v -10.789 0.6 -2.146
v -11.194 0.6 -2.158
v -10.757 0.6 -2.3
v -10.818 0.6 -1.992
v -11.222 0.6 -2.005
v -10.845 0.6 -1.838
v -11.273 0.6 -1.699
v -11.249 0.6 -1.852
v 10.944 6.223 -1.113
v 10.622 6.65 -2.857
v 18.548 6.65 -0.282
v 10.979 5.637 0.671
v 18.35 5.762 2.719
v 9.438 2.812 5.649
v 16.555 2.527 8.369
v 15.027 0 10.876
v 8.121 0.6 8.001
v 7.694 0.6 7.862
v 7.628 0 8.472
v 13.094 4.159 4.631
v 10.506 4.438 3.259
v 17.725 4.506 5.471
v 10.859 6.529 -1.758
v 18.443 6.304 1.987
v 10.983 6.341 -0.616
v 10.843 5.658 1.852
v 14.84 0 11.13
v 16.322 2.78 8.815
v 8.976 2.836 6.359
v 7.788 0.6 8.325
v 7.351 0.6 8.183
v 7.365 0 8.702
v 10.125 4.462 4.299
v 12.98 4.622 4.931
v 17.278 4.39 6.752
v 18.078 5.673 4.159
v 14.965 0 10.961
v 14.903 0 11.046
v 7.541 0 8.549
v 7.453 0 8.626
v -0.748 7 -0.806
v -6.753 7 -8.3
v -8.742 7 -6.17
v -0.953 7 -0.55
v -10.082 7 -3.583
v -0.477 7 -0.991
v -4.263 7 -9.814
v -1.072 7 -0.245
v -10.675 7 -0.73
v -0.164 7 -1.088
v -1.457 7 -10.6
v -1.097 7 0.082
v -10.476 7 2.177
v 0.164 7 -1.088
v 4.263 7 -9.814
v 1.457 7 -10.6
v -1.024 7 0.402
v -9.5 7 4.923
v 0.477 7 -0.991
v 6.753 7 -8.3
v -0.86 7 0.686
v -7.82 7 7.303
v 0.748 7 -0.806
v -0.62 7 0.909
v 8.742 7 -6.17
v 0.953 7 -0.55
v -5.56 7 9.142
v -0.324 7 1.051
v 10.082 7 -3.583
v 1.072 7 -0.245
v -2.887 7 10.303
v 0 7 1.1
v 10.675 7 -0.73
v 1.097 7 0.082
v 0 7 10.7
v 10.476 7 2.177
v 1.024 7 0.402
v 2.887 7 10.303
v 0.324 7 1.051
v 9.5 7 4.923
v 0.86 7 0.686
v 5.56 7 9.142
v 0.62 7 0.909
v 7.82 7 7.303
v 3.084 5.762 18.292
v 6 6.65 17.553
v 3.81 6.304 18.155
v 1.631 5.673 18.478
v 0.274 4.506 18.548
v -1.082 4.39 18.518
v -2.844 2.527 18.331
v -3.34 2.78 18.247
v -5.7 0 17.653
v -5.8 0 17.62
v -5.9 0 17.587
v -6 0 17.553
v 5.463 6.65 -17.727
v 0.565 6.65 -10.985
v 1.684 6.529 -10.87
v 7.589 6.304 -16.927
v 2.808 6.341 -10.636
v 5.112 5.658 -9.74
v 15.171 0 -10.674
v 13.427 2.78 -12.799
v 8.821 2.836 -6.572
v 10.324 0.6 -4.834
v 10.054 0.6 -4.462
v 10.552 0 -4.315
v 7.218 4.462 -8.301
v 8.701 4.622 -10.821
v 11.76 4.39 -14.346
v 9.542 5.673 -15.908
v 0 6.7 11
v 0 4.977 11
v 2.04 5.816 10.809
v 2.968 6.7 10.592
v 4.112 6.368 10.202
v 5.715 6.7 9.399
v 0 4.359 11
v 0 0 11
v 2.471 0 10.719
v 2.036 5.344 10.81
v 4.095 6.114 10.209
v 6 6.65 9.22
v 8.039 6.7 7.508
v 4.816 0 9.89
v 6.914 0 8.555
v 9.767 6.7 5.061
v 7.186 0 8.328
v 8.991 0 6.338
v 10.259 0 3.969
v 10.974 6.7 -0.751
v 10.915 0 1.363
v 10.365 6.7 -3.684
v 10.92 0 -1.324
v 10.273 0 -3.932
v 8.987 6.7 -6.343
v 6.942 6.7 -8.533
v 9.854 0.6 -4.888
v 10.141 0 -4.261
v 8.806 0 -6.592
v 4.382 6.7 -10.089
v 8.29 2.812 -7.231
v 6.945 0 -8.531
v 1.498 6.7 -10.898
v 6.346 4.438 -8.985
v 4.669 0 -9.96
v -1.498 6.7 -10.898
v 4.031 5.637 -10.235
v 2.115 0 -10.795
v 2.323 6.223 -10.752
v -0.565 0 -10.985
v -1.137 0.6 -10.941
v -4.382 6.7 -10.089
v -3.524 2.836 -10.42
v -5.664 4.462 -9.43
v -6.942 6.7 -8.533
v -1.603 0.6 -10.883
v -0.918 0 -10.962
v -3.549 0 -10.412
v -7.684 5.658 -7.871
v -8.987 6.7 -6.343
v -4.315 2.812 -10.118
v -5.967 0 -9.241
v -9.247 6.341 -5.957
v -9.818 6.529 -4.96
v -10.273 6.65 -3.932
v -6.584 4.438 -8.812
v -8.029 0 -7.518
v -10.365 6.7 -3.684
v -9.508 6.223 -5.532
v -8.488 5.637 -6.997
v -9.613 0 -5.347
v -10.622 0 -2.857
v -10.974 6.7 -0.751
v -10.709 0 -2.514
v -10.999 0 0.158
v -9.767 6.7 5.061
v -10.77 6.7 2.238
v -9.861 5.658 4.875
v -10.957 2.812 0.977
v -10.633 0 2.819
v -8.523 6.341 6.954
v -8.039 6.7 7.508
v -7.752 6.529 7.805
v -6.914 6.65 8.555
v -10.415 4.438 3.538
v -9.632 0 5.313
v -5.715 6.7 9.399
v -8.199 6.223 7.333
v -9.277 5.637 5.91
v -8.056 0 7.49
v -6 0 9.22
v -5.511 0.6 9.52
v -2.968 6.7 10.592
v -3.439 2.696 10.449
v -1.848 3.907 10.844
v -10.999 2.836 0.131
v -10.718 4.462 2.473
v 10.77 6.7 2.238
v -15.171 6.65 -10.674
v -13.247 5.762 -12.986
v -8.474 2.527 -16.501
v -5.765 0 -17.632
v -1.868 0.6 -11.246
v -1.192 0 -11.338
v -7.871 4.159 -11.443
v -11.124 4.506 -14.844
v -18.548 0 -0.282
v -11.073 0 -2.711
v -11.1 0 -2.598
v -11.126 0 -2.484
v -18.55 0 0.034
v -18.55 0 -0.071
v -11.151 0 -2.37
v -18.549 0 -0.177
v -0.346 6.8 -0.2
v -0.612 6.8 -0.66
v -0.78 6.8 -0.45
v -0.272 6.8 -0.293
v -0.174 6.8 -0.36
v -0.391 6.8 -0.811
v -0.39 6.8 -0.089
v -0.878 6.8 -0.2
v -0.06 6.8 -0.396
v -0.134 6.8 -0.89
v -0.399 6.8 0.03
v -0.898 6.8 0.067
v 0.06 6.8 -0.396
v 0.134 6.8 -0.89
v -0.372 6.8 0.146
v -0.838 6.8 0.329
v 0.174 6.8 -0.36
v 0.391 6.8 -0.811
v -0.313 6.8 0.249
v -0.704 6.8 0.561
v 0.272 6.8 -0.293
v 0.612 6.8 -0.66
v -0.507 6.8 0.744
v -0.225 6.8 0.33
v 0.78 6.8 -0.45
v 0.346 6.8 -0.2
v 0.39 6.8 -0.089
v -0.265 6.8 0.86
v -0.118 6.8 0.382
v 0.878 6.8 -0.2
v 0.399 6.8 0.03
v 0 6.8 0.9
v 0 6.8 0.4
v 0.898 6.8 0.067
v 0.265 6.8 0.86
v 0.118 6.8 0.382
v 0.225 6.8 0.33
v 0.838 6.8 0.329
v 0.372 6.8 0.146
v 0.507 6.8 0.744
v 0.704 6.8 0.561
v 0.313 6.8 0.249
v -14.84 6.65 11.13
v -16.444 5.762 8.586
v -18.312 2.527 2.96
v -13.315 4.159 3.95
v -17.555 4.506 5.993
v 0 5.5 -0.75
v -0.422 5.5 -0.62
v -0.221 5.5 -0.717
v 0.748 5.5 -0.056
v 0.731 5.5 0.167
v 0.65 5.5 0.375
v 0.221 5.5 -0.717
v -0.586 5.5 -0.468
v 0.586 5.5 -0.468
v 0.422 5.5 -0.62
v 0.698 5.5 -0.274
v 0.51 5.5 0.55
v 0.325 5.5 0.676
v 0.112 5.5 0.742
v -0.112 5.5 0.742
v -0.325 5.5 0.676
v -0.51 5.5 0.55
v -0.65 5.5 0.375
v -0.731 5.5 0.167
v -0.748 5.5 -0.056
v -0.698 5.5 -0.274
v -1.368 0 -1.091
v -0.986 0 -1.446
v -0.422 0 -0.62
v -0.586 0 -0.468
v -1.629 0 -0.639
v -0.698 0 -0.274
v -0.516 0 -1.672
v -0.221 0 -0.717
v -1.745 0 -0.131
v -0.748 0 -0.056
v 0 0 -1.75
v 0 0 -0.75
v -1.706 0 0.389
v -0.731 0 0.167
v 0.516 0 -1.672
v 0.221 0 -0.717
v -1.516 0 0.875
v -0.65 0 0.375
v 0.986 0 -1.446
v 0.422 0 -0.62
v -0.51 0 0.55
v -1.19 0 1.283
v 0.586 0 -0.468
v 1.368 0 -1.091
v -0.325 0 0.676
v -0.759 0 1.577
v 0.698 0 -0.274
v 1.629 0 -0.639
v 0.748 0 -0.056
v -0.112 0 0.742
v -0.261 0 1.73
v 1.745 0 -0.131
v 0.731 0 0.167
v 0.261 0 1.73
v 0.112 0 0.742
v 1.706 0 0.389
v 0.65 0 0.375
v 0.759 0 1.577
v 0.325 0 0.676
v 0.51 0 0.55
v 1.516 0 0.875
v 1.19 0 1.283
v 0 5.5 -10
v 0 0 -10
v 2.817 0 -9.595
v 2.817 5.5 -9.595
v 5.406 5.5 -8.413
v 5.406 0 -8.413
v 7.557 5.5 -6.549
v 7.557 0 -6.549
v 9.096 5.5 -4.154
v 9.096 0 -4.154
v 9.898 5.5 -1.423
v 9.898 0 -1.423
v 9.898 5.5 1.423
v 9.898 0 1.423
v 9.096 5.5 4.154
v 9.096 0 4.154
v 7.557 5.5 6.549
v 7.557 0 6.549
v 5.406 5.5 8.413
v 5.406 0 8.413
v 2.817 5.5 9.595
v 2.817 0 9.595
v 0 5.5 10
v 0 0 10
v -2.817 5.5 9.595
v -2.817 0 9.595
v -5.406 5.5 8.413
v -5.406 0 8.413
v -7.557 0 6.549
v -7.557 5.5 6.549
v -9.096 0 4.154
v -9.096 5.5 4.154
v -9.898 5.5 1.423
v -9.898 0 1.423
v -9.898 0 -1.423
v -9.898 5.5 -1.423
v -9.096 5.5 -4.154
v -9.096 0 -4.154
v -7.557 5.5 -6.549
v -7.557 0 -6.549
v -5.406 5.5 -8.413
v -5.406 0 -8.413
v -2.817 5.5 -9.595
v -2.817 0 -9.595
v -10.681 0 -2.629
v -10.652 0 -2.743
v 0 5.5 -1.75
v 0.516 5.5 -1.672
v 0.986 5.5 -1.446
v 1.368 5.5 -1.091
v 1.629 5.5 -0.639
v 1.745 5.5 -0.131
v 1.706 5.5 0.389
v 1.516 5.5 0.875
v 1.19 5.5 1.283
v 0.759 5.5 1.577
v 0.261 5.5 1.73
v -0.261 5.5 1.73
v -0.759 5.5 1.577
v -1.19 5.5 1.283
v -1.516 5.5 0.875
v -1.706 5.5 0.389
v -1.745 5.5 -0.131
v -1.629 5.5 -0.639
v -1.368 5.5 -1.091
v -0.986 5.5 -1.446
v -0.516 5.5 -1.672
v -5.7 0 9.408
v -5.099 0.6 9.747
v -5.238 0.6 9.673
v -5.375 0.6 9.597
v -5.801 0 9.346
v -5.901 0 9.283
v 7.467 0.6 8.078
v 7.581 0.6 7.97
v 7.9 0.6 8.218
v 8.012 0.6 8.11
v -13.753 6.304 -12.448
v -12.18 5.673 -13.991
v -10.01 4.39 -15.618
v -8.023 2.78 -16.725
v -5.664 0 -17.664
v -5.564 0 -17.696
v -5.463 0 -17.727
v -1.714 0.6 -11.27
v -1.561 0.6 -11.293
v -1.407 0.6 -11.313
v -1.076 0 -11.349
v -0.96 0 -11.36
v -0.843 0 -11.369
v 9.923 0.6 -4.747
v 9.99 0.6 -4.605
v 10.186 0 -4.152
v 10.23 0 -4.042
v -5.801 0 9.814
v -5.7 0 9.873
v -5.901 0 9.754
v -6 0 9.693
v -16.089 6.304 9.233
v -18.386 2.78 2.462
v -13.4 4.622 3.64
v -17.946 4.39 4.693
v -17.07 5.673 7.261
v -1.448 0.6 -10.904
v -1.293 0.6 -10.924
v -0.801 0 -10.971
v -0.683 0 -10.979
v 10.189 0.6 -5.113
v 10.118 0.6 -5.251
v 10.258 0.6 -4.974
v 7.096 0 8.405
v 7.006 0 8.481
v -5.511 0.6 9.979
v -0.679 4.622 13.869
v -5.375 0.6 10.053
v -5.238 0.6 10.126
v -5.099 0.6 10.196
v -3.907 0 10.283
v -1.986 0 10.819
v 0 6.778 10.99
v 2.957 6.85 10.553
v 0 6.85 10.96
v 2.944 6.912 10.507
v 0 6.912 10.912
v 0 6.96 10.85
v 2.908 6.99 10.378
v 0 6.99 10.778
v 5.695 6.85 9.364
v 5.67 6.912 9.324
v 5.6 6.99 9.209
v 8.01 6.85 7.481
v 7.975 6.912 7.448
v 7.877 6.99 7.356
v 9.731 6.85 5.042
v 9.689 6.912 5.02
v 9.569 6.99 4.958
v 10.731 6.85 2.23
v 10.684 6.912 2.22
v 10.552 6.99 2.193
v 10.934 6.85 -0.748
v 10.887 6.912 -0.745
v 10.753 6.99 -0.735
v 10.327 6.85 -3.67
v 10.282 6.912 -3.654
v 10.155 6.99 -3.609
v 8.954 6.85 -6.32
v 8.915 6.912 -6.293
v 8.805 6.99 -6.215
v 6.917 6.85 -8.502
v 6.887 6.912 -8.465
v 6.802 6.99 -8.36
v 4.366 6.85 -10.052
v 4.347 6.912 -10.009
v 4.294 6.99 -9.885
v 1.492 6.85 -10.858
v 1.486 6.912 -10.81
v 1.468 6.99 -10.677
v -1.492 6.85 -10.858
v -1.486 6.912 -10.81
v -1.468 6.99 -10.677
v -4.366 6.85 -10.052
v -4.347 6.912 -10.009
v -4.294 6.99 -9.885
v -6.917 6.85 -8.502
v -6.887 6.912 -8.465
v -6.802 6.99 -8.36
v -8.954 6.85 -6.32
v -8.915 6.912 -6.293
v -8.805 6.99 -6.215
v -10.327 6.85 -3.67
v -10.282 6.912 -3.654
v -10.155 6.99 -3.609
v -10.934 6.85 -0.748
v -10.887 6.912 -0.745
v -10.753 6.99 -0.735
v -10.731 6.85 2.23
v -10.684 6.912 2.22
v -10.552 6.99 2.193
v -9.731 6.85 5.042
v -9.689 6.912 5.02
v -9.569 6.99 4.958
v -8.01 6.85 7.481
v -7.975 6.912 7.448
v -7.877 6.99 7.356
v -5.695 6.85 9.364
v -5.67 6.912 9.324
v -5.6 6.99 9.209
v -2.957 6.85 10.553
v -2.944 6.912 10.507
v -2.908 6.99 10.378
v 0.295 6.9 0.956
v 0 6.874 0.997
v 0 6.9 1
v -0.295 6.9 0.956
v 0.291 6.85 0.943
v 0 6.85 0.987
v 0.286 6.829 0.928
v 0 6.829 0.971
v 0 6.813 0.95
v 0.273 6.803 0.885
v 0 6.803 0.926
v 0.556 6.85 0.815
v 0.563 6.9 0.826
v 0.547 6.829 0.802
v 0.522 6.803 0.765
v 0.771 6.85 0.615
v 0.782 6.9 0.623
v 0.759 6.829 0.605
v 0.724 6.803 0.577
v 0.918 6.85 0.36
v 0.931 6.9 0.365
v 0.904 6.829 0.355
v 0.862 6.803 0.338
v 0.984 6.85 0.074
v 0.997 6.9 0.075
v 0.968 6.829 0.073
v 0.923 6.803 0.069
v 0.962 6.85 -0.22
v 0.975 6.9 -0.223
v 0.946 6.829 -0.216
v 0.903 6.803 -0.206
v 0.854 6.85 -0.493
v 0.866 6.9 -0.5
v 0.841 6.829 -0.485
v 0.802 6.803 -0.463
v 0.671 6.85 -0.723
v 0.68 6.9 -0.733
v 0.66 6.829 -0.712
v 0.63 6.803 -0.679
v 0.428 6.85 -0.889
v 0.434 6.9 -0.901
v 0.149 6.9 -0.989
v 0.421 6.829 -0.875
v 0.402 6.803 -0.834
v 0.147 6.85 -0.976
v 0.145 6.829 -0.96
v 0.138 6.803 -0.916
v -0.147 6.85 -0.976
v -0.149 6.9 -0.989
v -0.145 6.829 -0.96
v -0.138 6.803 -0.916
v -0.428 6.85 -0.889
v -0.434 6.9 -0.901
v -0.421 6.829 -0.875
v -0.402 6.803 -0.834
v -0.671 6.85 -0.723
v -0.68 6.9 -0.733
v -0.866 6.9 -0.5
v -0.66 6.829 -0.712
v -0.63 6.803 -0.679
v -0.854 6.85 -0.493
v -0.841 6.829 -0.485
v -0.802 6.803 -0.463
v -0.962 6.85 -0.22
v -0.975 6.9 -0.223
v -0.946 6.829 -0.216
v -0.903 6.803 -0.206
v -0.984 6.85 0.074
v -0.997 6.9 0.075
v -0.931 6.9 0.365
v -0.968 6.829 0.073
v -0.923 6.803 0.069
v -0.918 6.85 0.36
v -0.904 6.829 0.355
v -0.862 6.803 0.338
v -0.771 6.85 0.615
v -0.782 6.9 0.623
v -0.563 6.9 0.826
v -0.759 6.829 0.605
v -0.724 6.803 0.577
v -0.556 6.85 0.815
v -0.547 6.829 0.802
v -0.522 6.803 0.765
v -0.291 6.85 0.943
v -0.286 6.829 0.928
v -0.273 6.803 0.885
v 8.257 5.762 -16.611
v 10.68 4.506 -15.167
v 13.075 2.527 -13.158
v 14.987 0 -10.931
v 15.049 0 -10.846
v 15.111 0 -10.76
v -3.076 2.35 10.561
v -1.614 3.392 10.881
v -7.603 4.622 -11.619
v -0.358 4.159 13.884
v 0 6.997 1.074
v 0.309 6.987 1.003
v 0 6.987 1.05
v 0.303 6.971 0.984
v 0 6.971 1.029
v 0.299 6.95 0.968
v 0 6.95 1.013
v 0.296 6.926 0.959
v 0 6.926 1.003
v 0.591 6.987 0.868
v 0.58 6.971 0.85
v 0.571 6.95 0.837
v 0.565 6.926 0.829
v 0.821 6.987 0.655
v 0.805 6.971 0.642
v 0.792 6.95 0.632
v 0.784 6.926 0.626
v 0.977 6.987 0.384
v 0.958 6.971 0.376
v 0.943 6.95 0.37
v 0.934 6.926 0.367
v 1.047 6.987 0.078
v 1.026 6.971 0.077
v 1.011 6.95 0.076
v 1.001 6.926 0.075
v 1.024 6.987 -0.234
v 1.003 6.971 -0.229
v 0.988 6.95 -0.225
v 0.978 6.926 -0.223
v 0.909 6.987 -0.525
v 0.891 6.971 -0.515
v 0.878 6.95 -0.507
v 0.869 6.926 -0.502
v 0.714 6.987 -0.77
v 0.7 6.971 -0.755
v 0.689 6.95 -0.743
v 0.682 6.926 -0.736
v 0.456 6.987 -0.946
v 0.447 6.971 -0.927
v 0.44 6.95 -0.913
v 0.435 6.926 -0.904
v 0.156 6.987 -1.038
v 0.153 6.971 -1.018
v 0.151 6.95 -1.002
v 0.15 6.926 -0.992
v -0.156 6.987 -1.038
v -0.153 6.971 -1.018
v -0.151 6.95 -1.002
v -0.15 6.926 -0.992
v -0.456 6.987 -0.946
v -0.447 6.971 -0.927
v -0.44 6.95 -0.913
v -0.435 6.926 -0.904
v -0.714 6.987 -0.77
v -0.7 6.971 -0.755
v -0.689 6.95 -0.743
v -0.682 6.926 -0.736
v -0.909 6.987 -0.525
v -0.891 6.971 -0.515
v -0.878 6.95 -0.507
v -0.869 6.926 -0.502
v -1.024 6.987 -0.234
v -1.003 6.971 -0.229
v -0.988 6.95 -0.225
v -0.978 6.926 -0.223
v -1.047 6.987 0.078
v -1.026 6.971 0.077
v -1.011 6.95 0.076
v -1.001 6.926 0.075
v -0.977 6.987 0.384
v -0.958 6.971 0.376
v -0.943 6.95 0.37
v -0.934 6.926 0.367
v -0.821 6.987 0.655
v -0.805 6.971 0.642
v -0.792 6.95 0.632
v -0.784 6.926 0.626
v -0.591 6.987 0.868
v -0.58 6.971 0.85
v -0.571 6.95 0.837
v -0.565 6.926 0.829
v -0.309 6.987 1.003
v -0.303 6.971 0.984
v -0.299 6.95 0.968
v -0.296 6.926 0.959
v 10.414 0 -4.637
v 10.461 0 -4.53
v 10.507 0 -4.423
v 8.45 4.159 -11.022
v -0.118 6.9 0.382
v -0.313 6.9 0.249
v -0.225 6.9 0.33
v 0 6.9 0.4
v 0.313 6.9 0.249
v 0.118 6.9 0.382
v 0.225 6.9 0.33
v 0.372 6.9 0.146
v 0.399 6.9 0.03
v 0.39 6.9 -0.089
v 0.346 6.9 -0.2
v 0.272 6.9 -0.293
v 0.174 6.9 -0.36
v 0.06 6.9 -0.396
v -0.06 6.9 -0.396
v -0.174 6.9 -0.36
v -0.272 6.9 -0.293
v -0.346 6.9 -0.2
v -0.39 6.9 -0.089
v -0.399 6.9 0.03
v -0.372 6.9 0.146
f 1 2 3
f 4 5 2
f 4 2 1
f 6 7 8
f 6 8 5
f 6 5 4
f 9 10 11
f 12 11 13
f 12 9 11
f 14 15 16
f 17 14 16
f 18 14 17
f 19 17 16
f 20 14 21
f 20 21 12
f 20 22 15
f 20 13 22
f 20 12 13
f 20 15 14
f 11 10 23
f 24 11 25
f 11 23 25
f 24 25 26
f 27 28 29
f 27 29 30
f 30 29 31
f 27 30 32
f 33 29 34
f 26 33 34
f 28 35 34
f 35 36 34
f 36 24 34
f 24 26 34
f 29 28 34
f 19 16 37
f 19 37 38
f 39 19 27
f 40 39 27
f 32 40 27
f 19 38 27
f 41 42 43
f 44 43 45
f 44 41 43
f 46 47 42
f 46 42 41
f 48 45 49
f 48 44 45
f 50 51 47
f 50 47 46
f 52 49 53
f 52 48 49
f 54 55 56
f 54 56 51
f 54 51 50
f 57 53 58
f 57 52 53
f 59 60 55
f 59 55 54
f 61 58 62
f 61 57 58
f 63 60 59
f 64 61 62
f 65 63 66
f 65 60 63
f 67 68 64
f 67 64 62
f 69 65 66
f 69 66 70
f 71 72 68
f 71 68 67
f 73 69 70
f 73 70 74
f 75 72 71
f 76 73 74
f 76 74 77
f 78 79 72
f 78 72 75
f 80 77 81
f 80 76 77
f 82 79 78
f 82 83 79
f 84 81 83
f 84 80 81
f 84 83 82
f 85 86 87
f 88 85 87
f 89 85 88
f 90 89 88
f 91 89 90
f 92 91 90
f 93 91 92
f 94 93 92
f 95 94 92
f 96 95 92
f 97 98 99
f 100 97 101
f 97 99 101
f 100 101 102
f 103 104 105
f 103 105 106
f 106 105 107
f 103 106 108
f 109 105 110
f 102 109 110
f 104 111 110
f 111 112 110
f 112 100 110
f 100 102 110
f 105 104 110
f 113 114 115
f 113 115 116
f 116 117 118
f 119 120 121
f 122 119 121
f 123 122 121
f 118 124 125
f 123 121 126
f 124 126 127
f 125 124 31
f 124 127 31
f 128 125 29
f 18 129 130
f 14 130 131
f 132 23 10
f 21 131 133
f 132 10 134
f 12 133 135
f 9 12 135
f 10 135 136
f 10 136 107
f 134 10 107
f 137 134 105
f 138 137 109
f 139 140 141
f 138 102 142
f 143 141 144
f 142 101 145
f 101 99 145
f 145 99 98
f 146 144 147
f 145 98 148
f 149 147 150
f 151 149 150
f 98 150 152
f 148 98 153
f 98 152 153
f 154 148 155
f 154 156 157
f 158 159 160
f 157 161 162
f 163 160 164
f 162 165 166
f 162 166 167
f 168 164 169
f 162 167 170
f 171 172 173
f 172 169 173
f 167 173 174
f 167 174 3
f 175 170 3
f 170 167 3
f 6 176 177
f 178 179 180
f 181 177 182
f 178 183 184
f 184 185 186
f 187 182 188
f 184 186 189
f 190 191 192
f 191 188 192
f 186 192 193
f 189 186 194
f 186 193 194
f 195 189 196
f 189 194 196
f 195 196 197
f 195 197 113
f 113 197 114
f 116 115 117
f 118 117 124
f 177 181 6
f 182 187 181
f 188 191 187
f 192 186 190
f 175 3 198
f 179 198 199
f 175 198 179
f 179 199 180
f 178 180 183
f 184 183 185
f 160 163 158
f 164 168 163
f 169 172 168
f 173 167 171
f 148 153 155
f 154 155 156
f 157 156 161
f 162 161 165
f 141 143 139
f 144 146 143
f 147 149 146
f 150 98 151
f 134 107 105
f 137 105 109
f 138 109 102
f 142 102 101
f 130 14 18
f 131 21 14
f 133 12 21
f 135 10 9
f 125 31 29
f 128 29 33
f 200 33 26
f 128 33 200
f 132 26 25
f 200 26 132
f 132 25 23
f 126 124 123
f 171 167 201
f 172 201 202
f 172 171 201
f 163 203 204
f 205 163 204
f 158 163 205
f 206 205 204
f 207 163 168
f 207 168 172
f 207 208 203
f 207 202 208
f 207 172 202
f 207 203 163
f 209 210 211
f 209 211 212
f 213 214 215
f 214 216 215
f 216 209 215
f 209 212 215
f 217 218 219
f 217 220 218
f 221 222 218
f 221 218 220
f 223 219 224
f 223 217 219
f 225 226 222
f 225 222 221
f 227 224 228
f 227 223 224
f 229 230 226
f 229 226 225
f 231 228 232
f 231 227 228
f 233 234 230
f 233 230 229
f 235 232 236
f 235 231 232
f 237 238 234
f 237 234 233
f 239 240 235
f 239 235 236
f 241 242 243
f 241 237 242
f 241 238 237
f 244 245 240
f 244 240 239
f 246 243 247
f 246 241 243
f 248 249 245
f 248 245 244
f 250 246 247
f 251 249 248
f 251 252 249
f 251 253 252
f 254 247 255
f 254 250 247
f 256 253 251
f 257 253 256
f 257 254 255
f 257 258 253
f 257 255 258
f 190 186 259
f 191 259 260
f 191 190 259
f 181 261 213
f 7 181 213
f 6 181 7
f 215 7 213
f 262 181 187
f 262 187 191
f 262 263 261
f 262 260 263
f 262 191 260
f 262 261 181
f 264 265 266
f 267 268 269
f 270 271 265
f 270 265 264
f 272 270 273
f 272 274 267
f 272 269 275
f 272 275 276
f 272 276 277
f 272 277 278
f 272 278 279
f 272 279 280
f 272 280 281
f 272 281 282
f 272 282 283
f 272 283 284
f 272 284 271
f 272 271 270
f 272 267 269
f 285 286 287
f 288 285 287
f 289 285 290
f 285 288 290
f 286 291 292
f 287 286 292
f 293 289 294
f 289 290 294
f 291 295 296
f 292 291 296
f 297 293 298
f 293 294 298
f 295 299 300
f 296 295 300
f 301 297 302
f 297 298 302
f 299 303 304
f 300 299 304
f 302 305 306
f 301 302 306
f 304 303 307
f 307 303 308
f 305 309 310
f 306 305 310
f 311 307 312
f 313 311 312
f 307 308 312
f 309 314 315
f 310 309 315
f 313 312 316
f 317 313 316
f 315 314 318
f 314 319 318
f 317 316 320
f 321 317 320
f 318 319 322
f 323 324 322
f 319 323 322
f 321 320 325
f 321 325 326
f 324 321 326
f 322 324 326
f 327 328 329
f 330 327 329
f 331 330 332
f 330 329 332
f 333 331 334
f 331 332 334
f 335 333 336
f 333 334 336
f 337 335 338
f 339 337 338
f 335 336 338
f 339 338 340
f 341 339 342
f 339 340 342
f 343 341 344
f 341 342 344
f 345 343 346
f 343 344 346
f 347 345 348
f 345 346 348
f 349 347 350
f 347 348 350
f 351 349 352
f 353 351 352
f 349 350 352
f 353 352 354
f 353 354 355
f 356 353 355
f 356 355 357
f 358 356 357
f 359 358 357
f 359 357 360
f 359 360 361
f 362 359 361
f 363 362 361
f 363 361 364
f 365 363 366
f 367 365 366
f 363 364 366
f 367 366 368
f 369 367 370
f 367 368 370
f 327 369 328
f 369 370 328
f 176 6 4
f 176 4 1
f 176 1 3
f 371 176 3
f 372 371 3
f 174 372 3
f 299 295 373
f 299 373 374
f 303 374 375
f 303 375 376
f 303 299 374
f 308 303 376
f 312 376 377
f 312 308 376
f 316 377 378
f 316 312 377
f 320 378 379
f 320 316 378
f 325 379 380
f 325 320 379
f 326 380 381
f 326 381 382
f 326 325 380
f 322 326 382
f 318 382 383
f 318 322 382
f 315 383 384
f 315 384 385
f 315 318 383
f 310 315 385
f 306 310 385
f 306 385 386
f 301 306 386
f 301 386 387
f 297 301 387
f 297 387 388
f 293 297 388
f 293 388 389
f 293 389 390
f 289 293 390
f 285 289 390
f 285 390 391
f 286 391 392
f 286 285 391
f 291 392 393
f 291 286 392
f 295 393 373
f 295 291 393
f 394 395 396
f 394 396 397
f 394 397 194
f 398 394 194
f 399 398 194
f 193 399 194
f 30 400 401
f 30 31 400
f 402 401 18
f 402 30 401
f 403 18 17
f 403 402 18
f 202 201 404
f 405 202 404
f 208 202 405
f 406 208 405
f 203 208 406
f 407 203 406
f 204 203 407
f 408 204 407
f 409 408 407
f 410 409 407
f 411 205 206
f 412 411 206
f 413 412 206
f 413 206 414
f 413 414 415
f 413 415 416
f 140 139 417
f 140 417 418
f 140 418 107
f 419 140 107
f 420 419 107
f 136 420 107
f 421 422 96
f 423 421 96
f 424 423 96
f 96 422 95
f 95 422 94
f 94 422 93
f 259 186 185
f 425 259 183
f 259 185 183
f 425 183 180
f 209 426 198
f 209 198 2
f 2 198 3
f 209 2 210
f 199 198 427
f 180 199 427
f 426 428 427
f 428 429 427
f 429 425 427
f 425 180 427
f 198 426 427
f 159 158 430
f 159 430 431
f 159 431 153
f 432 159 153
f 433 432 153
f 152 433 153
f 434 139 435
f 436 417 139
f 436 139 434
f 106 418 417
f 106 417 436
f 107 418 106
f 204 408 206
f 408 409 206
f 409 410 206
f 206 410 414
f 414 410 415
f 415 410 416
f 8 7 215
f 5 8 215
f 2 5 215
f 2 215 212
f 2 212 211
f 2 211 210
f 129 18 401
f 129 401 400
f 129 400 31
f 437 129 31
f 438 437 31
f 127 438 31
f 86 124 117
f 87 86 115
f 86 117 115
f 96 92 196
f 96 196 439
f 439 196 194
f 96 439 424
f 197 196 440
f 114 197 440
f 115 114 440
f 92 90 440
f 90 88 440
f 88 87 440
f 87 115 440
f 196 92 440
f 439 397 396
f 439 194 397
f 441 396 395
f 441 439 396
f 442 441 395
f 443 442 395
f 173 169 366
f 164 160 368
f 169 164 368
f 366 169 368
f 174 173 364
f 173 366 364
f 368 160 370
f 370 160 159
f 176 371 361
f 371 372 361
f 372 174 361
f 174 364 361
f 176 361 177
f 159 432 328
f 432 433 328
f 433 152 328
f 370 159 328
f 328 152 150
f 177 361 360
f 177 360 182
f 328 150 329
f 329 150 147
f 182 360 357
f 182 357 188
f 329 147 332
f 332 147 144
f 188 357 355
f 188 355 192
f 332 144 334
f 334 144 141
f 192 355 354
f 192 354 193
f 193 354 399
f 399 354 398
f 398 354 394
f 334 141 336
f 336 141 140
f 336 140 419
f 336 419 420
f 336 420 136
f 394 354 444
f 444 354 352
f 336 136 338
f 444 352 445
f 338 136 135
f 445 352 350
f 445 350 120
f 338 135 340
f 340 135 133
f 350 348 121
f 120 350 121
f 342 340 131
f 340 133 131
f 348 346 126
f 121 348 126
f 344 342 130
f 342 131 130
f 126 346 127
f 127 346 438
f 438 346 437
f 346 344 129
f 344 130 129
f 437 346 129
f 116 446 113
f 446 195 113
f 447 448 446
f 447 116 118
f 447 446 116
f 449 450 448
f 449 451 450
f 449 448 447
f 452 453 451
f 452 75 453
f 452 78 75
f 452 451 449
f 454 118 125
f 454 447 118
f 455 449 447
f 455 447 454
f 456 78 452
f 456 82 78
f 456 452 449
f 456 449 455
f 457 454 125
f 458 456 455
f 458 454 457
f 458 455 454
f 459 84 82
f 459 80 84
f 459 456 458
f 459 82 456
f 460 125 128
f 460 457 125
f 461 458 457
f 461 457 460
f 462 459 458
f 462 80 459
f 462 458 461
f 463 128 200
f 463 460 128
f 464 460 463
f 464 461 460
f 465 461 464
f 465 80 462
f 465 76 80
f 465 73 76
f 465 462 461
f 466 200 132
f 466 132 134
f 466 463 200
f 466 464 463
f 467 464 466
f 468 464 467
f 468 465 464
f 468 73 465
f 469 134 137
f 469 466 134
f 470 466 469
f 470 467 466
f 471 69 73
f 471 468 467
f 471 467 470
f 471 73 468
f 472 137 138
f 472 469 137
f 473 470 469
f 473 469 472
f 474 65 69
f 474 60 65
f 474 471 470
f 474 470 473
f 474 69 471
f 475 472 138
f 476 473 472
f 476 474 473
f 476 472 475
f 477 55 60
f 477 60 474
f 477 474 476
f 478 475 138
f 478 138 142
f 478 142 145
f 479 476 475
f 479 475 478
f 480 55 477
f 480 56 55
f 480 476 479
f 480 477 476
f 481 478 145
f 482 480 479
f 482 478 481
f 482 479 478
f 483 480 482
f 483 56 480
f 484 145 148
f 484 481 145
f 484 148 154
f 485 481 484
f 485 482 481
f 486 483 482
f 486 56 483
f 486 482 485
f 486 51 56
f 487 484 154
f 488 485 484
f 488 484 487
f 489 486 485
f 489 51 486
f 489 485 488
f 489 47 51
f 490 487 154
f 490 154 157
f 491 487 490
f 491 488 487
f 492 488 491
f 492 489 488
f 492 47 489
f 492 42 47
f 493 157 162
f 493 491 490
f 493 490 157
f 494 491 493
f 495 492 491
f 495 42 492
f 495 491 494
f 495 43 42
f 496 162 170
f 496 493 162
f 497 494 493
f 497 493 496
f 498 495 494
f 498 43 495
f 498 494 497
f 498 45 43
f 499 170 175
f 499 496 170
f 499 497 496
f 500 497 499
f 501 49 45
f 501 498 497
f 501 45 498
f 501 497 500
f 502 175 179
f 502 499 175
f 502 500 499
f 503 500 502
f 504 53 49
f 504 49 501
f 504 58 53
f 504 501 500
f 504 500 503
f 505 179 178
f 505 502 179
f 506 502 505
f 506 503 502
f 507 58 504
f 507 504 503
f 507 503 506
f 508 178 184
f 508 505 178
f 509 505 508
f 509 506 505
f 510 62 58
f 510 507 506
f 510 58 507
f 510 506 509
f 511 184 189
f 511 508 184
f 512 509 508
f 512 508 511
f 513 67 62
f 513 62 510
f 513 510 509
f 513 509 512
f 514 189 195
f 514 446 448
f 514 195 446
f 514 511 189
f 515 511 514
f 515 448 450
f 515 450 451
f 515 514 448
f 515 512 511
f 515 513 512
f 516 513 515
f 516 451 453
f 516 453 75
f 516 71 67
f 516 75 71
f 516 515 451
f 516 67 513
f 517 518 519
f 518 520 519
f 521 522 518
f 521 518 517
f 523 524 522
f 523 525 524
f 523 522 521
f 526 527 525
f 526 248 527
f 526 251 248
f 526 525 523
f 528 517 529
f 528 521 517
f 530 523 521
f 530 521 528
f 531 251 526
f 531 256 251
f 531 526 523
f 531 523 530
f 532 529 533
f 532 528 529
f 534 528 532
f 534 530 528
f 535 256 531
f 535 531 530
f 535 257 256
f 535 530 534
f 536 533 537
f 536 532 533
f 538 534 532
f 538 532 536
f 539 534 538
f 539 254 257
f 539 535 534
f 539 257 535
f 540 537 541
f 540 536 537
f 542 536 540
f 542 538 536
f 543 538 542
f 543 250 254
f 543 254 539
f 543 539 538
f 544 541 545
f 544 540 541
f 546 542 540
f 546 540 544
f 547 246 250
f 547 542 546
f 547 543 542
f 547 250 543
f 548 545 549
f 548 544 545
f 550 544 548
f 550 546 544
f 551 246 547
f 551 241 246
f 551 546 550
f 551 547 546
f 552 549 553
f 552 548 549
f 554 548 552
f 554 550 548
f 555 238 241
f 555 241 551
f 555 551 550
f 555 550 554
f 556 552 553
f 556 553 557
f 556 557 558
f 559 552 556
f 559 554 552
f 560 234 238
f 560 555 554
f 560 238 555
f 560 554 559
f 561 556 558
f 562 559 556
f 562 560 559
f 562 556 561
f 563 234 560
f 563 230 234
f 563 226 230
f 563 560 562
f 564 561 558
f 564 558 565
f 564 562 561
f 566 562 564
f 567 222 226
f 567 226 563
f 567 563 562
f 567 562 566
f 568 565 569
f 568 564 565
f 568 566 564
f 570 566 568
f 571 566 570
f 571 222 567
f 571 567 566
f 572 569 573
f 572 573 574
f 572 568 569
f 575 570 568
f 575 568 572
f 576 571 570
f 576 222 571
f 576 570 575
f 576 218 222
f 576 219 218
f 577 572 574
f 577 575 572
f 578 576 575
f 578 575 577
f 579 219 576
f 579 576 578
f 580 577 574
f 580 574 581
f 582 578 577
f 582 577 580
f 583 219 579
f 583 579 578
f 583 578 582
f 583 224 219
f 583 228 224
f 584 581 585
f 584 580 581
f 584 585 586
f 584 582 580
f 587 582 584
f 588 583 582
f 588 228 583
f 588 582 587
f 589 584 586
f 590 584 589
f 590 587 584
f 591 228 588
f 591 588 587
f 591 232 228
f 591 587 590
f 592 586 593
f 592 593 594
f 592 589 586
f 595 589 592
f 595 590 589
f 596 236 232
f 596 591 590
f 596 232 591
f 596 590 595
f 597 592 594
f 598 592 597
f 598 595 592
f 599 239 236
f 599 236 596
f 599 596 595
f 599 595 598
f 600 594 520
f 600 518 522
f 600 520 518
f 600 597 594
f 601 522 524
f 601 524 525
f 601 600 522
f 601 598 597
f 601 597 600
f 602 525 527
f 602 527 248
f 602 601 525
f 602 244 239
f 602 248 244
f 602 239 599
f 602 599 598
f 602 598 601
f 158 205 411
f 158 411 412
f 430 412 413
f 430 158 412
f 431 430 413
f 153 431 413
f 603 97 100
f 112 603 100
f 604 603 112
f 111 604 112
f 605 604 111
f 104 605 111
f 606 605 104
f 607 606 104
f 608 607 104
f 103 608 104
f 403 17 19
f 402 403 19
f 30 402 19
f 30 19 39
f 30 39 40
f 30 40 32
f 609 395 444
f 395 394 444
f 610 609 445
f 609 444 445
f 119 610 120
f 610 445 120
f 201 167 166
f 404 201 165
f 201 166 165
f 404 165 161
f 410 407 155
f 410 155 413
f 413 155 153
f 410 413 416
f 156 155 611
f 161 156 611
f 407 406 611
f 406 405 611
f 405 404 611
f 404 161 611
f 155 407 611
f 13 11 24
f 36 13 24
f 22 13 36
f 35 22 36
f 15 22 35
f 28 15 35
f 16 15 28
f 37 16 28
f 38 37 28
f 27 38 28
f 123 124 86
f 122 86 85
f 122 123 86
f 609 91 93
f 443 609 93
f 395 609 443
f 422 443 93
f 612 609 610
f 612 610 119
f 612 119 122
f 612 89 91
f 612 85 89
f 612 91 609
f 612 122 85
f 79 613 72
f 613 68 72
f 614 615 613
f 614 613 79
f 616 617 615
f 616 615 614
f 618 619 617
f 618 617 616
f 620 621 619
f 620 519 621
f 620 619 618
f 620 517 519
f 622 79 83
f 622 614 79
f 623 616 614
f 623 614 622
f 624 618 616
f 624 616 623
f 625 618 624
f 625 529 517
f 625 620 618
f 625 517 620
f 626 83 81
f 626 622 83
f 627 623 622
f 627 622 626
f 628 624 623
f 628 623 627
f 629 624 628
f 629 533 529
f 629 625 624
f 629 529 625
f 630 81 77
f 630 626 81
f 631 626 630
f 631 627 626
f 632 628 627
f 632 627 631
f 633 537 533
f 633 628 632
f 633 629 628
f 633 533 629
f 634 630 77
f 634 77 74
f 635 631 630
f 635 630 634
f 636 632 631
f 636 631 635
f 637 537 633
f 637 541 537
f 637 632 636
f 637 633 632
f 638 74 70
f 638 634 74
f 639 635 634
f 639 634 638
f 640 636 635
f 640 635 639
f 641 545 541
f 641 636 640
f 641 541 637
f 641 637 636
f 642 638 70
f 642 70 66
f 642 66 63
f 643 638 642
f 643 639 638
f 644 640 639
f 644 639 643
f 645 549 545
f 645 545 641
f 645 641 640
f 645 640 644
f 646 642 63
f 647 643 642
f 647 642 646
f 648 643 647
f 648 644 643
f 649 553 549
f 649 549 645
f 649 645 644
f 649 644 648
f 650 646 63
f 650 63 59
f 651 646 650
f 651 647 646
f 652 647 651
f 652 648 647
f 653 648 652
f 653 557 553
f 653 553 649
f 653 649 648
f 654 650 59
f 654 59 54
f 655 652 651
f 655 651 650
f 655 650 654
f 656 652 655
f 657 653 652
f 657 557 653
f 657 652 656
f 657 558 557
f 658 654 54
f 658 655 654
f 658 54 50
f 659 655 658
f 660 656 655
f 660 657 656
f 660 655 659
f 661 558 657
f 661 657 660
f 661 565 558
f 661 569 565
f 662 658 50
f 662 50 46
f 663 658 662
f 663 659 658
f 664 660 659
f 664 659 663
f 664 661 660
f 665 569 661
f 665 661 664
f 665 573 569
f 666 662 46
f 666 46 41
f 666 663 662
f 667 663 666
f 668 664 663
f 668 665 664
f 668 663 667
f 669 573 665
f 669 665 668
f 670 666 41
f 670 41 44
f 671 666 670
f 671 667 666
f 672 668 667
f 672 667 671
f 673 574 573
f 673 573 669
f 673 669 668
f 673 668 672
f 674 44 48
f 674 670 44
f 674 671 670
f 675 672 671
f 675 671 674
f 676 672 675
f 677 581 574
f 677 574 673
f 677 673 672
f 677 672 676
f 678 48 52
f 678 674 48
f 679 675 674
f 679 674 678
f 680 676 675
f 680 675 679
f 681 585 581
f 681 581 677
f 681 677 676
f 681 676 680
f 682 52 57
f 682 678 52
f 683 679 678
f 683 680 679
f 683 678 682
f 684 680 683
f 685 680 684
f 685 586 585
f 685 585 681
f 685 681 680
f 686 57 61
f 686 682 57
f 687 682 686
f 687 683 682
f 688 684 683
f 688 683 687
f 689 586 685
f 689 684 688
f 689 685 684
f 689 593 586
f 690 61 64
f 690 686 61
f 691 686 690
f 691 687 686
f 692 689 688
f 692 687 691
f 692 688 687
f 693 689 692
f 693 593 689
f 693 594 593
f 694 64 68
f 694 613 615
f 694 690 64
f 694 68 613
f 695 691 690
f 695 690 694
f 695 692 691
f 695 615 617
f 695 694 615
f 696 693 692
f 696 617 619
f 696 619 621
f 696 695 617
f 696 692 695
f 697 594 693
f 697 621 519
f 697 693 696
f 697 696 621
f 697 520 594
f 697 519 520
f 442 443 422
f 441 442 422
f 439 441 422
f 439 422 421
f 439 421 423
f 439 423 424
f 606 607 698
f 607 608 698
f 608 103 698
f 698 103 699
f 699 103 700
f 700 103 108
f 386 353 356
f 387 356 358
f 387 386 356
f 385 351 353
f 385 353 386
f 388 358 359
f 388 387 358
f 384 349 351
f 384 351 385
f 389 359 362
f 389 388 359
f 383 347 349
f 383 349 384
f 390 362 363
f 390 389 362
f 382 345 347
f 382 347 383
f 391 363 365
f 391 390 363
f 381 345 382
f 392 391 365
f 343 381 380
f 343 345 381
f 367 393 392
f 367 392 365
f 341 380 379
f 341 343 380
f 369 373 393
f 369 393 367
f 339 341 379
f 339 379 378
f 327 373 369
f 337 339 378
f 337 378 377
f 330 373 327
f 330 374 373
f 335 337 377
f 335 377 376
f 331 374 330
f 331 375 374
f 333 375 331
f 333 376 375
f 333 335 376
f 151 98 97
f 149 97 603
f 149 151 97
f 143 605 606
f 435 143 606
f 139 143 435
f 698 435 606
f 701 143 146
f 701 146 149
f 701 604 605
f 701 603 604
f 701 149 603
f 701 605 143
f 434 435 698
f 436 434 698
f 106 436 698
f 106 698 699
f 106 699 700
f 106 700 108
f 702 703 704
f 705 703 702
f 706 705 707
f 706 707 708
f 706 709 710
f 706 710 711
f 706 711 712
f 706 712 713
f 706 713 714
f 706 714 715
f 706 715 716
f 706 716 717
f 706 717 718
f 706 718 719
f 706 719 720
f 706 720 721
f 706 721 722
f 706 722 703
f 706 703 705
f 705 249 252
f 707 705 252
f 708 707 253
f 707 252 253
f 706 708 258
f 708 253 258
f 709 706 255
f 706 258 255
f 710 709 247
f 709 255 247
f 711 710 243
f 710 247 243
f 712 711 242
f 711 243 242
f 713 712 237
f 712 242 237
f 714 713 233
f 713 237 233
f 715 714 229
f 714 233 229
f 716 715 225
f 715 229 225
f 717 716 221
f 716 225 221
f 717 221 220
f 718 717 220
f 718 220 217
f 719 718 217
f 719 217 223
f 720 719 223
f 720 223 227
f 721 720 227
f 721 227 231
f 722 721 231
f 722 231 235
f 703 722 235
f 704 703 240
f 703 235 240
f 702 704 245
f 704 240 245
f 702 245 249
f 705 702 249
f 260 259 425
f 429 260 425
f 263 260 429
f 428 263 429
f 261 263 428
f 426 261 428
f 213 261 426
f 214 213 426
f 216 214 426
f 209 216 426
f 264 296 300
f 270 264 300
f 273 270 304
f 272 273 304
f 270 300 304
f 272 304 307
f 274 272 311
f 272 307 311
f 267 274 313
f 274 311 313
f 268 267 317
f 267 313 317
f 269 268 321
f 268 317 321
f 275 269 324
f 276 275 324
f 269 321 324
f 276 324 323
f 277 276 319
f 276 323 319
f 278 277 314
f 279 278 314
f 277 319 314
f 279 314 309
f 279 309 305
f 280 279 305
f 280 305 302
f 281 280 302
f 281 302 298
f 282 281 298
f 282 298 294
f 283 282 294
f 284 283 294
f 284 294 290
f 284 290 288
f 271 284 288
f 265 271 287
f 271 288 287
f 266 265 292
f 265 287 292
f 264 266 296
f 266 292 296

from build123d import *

# Parameters (mm, degrees)
SKETCH1_R                = 11
BOSS_EXTRUDE1_DEPTH      = 7
BOSS_EXTRUDE2_REACH      = 19.059
BOSS_EXTRUDE2_END_RADIUS = 18.55
CIRPATTERN1_COUNT        = 5
SKETCH4_R                = 10
SKETCH4_R_2              = 1.75
SKETCH4_R_3              = 0.75
CUT_EXTRUDE1_DEPTH       = 5.5
FILLET1_R                = 0.3
SKETCH5_R                = 1
CUT_EXTRUDE2_DEPTH       = 0.2
FILLET2_R                = 0.1
SKETCH6_R                = 11.4
SKETCH6_R_2              = 11
CUT_EXTRUDE3_DEPTH       = 0.6
SKETCH7_R                = 0.4
BOSS_EXTRUDE3_DEPTH      = 0.1


with BuildPart() as part:
    # Sketch1 → Boss-Extrude1 (new body)
    with BuildSketch(Plane(origin=(0, 0, 0), x_dir=(1, 0, 0), z_dir=(0, 1, 0))):
        with Locations(Location((0, 0, 0), (0, 0, 270))):
            Circle(SKETCH1_R)
    extrude(amount=BOSS_EXTRUDE1_DEPTH)

    # Boss-Extrude2: up to this cylinder (the profile starts inside it)
    boss_extrude2_end = Plane(origin=(0, 3.843243, 0), z_dir=(0, -1, 0)) * Cylinder(BOSS_EXTRUDE2_END_RADIUS, 76.218, mode=Mode.PRIVATE)
    # Sketch2 → Boss-Extrude2 (add, up to the surface)
    with BuildSketch(Plane.XY, mode=Mode.PRIVATE) as boss_extrude2_sk1:
        with BuildLine():
            Line((-6, 0), (-5.7, 0))
            add(Edge.make_bspline(
                [(6, 6.65), (-0.86634689, 4.993225635), (-5.7, 0)],
                knots=[0, 0, 0, 1, 1, 1], degree=2))
            add(Edge.make_bspline(
                [(6, 6.65), (-1.357374642, 5.918314261), (-6, 0)],
                knots=[0, 0, 0, 1, 1, 1], degree=2))
        make_face()
    boss_extrude2_tool1 = extrude(boss_extrude2_sk1.sketch, amount=BOSS_EXTRUDE2_REACH, mode=Mode.PRIVATE) & boss_extrude2_end
    boss_extrude2 = boss_extrude2_tool1.solids().sort_by_distance((-0.900536, 3.843243, 0))[0]
    add(boss_extrude2)

    # CirPattern1: Boss-Extrude2 ×5 about axis
    cirpattern1_axis = Axis((0, 7, 0), (0, -1, 0))
    for i in range(1, CIRPATTERN1_COUNT):
        add(boss_extrude2.rotate(cirpattern1_axis, i * 360 / CIRPATTERN1_COUNT))

    # Sketch4 → Cut-Extrude1 (cut)
    # profile 1 of 2: a face of its own
    with BuildSketch(Plane.XZ):
        with Locations(Location((0, 0, 0), (0, 0, 270))):
            Circle(SKETCH4_R)
        with Locations(Location((0, 0, 0), (0, 0, 270))):
            Circle(SKETCH4_R_2, mode=Mode.SUBTRACT)
    # profile 2 of 2: a face of its own
    with BuildSketch(Plane.XZ):
        with Locations(Location((0, 0, 0), (0, 0, 270))):
            Circle(SKETCH4_R_3)
    extrude(amount=-CUT_EXTRUDE1_DEPTH, mode=Mode.SUBTRACT)

    # Fillet1
    fillet1_edges = [part.edges().sort_by_distance(p)[0] for p in [
        (0, 7, -11),
    ]]
    fillet(fillet1_edges, radius=FILLET1_R)

    # Sketch5 → Cut-Extrude2 (cut)
    with BuildSketch(Plane(origin=(0, 7, 0), x_dir=(1, 0, 0), z_dir=(0, 1, 0))):
        with Locations(Location((0, 0, 0), (0, 0, 270))):
            Circle(SKETCH5_R)
    extrude(amount=-CUT_EXTRUDE2_DEPTH, mode=Mode.SUBTRACT)

    # Fillet2
    fillet2_edges = [part.edges().sort_by_distance(p)[0] for p in [
        (0, 6.8, -1),
        (0, 7, -1),
    ]]
    fillet(fillet2_edges, radius=FILLET2_R - 0.0001)  # a hair under: the kernel refuses the full size

    # Sketch6 → Cut-Extrude3 (cut)
    with BuildSketch(Plane.XZ):
        Circle(SKETCH6_R)
        with Locations(Location((0, 0, 0), (0, 0, 90))):
            Circle(SKETCH6_R_2, mode=Mode.SUBTRACT)
    extrude(amount=-CUT_EXTRUDE3_DEPTH, mode=Mode.SUBTRACT)

    # Sketch7 → Boss-Extrude3 (add)
    with BuildSketch(Plane(origin=(0, 6.8, 0), x_dir=(1, 0, 0), z_dir=(0, 1, 0))):
        with Locations(Location((0, 0, 0), (0, 0, 270))):
            Circle(SKETCH7_R)
    extrude(amount=BOSS_EXTRUDE3_DEPTH)


solid = part.part
